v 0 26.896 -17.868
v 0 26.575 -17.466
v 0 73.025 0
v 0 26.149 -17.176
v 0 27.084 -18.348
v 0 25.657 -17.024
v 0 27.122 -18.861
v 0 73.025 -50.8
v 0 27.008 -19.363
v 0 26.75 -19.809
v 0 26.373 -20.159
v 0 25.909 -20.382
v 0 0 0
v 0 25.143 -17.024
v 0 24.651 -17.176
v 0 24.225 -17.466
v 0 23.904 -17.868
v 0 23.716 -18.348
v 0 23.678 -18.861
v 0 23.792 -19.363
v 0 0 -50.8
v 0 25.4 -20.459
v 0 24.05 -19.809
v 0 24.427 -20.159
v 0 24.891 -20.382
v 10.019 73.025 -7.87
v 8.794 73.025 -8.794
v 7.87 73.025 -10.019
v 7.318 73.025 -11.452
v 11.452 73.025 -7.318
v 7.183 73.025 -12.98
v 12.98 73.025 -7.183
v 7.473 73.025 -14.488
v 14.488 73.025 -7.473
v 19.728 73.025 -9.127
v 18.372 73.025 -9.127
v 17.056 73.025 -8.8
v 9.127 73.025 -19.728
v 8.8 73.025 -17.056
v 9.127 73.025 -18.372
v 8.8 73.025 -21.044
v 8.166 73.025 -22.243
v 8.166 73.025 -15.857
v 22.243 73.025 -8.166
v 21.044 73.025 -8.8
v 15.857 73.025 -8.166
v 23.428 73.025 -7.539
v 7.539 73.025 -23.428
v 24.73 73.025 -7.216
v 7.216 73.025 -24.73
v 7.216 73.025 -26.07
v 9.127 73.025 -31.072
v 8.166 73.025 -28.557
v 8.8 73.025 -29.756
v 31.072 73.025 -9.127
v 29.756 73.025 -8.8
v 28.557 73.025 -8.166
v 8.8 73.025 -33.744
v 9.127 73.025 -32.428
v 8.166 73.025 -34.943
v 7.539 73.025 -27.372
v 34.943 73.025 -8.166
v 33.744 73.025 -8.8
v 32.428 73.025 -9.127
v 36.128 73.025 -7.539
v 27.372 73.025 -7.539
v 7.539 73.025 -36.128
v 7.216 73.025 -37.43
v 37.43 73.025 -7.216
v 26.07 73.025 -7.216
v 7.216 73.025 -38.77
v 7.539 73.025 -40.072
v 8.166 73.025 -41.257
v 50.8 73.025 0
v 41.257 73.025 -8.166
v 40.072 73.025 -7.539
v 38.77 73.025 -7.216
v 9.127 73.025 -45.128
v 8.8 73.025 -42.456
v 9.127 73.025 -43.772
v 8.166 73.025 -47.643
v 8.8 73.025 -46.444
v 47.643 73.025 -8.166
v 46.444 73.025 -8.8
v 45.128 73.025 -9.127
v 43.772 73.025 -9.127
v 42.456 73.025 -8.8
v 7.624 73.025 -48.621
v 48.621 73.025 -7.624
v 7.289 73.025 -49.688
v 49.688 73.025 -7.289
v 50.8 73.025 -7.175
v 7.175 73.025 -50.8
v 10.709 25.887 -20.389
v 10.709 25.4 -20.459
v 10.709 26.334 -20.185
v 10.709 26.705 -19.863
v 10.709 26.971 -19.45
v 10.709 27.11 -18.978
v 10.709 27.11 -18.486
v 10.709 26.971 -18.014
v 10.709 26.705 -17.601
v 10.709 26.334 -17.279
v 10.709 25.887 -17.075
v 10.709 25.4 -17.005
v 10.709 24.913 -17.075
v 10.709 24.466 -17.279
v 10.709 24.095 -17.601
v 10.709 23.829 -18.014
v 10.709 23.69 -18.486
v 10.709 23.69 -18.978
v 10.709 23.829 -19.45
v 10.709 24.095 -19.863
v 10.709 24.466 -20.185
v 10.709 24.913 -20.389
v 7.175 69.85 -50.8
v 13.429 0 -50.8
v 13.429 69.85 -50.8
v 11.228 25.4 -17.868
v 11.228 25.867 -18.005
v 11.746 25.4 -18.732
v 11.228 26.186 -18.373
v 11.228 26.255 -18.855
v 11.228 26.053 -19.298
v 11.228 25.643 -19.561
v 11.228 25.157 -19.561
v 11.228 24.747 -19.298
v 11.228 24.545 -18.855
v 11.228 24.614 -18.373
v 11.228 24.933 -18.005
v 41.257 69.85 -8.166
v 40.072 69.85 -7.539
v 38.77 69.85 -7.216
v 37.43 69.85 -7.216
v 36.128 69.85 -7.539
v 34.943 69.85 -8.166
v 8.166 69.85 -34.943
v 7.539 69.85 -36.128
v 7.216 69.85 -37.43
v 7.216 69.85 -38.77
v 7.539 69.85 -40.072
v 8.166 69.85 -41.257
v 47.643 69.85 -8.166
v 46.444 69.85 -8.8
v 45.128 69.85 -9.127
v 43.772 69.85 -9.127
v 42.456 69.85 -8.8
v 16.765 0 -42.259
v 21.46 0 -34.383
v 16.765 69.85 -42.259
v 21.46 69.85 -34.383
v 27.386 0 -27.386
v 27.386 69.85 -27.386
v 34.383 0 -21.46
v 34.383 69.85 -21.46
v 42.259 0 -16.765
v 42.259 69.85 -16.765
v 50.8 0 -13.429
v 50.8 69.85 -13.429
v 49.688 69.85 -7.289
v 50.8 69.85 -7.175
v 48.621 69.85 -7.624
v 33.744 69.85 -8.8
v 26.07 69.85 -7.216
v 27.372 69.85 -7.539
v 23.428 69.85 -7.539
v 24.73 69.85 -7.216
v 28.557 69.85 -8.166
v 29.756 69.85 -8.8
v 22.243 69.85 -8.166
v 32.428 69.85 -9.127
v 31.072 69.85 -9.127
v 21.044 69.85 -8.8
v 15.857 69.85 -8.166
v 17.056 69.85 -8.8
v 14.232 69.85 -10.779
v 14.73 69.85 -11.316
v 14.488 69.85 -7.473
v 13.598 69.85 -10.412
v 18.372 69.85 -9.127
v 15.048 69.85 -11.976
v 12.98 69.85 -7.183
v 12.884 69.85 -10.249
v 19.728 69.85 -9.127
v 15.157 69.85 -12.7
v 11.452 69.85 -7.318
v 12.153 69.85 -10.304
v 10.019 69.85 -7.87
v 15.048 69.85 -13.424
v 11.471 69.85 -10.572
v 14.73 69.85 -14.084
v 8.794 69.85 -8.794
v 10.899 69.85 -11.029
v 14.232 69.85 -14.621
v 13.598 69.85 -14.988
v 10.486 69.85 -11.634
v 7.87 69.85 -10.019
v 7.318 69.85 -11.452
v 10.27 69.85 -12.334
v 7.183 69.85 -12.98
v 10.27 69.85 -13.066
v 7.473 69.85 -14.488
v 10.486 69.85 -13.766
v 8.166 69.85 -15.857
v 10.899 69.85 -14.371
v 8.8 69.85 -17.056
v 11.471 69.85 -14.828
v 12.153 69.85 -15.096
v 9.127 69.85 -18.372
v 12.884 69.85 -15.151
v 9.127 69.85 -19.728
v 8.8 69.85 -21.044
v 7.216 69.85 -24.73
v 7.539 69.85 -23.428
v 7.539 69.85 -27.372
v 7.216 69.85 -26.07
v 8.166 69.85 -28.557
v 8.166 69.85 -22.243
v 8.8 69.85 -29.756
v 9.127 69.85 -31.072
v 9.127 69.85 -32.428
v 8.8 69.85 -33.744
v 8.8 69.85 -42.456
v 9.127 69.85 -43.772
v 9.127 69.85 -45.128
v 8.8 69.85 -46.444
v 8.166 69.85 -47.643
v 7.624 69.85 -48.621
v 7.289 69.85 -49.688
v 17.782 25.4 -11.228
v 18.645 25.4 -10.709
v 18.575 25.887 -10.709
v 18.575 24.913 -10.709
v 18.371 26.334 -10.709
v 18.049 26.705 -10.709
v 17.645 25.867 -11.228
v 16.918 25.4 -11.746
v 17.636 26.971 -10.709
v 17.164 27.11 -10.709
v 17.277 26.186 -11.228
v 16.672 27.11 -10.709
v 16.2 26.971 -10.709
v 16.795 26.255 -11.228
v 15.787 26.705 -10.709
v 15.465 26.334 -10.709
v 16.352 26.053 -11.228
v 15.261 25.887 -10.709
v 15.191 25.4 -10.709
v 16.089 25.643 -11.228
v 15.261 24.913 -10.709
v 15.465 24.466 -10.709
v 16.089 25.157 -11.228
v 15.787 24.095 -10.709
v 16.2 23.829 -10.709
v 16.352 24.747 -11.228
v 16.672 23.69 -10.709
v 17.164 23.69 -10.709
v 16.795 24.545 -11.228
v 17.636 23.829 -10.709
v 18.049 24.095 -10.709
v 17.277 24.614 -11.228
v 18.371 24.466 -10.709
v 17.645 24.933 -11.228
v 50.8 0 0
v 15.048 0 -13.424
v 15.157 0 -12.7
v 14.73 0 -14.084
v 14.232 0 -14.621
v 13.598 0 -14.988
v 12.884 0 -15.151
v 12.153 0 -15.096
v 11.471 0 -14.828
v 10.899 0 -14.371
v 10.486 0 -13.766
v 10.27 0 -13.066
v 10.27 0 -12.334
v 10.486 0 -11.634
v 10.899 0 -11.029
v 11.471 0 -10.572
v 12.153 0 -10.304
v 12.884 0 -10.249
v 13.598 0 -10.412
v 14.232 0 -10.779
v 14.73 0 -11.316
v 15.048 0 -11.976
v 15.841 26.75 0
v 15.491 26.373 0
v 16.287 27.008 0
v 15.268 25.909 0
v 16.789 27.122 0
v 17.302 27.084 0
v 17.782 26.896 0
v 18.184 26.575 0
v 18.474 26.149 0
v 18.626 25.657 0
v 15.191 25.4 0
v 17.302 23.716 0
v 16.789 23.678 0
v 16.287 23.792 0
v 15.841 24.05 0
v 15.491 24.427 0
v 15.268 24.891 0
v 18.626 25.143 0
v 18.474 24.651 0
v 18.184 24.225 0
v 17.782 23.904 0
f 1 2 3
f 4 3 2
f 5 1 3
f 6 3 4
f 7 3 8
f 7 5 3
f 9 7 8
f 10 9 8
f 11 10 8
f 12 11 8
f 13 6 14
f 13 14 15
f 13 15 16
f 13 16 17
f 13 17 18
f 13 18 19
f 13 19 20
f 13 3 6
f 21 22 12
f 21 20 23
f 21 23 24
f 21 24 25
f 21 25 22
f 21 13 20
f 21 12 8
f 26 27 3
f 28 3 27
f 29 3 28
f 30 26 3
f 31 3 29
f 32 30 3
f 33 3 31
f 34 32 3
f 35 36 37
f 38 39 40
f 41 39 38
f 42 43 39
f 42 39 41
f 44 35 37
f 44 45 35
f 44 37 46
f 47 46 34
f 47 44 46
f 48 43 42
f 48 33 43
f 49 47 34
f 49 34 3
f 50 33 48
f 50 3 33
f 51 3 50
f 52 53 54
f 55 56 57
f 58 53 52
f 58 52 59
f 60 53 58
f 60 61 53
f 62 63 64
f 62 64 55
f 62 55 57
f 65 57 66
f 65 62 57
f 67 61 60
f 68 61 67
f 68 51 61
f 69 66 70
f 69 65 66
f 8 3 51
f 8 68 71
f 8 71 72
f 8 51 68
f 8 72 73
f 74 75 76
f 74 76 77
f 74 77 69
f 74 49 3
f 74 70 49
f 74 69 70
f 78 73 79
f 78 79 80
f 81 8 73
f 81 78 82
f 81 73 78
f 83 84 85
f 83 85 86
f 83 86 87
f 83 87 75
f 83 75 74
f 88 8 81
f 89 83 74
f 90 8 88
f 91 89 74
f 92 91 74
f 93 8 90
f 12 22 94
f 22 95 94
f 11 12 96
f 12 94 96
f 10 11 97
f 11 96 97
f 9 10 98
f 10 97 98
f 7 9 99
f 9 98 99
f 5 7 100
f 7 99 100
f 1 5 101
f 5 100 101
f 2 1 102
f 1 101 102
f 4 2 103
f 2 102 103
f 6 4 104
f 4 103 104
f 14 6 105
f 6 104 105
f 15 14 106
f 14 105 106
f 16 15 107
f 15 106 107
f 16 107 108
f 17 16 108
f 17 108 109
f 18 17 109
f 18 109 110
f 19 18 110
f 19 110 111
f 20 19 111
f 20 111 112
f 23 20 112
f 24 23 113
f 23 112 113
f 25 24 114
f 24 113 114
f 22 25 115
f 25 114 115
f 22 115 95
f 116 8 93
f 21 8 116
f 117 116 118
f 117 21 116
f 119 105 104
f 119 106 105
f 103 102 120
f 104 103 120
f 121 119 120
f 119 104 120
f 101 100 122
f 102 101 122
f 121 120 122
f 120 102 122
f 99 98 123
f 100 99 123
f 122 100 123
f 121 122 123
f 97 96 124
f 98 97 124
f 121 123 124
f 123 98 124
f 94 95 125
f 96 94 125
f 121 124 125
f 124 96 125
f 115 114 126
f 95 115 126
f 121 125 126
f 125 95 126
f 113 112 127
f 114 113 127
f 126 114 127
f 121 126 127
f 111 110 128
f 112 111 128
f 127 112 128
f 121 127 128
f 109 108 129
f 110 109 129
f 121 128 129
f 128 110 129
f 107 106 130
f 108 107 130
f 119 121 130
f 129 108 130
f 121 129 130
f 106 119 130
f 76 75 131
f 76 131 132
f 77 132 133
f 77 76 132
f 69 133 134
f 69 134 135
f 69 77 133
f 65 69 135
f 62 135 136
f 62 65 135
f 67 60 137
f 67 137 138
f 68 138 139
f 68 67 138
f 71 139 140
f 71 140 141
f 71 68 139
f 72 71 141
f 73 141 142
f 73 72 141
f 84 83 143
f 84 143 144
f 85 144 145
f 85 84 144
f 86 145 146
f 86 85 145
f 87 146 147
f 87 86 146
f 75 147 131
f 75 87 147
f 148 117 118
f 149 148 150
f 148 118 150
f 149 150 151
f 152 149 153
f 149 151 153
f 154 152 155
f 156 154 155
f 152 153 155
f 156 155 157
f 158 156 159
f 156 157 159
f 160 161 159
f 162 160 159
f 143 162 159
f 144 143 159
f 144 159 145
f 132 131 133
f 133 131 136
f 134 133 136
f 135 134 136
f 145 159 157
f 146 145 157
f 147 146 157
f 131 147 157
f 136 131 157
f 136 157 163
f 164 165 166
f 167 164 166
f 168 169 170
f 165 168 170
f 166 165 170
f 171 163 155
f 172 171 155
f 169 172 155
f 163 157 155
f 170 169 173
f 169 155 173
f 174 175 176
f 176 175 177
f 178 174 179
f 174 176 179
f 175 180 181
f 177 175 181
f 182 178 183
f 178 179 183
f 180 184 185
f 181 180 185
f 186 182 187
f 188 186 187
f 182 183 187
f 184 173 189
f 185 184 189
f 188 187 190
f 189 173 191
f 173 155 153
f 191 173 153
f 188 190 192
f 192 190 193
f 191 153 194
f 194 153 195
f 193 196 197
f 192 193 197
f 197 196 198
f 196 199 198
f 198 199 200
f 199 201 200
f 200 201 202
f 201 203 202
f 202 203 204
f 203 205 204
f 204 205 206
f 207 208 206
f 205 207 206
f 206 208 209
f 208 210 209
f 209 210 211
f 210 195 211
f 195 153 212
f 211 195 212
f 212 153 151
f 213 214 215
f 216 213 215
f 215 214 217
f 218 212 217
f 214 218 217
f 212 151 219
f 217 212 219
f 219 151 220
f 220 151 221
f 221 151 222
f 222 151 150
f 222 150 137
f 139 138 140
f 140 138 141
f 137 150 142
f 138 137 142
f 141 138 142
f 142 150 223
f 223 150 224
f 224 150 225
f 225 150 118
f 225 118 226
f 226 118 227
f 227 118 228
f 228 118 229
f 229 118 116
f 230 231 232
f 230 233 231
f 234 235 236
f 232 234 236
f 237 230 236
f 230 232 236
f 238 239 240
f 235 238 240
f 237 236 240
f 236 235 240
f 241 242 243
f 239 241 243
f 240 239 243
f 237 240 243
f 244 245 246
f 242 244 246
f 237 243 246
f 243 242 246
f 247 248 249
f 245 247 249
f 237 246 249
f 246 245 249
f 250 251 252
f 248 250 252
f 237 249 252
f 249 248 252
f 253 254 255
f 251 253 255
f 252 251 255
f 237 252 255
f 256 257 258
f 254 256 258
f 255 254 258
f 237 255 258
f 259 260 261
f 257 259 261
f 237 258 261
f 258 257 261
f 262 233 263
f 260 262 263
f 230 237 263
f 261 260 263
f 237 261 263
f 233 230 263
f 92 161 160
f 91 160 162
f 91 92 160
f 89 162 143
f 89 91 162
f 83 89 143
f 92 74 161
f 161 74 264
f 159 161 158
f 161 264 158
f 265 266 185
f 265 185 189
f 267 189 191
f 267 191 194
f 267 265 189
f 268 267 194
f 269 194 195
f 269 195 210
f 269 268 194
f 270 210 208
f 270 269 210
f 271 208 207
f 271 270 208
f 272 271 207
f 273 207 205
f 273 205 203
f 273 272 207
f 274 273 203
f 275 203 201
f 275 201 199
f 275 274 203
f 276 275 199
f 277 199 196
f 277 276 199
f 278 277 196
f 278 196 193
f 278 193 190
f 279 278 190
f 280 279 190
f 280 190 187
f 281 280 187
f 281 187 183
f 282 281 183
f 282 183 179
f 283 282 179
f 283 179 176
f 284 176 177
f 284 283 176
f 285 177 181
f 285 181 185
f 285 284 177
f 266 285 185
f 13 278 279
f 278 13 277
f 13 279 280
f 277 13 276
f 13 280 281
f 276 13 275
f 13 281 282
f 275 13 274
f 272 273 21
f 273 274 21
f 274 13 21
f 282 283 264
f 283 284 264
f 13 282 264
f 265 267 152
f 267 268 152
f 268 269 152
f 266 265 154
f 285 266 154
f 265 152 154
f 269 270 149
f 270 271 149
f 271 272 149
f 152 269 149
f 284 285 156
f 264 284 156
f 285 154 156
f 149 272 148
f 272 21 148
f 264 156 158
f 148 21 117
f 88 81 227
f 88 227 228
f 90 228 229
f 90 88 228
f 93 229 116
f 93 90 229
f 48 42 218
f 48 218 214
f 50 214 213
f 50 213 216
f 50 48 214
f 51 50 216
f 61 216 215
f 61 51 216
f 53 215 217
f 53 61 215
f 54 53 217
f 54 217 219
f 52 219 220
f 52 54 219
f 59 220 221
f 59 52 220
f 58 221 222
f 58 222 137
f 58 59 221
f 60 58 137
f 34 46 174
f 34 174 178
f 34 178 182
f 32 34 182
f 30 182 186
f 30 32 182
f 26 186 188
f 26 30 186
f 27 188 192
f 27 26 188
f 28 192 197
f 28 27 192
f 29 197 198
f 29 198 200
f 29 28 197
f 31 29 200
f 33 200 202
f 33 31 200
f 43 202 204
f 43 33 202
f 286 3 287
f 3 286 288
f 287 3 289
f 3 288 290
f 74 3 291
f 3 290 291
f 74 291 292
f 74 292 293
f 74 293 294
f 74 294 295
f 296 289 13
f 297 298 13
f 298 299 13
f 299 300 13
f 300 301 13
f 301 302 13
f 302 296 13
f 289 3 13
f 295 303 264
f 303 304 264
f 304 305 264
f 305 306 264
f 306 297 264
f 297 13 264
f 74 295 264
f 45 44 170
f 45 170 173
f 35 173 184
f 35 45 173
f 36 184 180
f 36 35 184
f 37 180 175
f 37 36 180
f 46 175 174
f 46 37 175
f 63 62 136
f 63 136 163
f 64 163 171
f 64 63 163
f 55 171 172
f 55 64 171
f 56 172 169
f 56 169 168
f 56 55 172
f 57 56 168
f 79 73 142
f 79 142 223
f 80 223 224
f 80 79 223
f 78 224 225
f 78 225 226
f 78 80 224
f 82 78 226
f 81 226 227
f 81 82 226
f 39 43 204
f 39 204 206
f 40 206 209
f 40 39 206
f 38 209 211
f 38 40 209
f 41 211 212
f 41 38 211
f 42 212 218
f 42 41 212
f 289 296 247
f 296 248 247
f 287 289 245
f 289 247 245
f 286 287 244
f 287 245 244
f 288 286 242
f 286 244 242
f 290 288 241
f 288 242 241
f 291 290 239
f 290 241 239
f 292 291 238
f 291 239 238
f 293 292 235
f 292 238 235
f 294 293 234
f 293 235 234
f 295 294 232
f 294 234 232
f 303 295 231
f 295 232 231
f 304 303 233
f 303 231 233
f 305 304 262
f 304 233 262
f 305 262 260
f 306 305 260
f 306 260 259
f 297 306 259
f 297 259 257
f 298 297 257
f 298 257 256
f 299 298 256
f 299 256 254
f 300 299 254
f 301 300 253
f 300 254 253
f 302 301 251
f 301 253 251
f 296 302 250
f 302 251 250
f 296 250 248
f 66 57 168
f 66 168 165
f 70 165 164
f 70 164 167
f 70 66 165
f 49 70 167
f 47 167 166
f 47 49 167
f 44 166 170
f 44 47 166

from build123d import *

# Parameters (mm, degrees)
SKETCH1_W                            = 50.8
SKETCH1_H                            = 50.8
BOSS_EXTRUDE1_DEPTH                  = 73.025
CUT_EXTRUDE1_DEPTH                   = 3.175
SKETCH3_R                            = 55.5625
CUT_EXTRUDE2_DEPTH                   = 103.439887861
F_8_32_TAPPED_HOLE1_D                = 3.4544
F_8_32_TAPPED_HOLE1_DEPTH            = 10.70864
F_8_32_TAPPED_HOLE1_TIP              = 1.037806461
F_8_32_TAPPED_HOLE2_D                = 3.4544
F_8_32_TAPPED_HOLE2_DEPTH            = 10.70864
F_8_32_TAPPED_HOLE2_TIP              = 1.037806461
F_10_0_1935_DIAMETER_HOLE1_OUTLINE_R = 2.45745
F_10_0_1935_DIAMETER_HOLE1_DEPTH     = 69.85


# Read off the part's stored shape, not the designer's step: #10 (0.1935) Diameter Hole1
with BuildPart() as part:
    # Sketch1 → Boss-Extrude1 (new body)
    with BuildSketch(Plane(origin=(0, 0, 0), x_dir=(1, 0, 0), z_dir=(0, 1, 0))):
        with Locations((25.4, 25.4)):
            Rectangle(SKETCH1_W, SKETCH1_H)
    extrude(amount=BOSS_EXTRUDE1_DEPTH)

    # Sketch2 → Cut-Extrude1 (cut)
    with BuildSketch(Plane(origin=(0, 73.025, 0), x_dir=(1, 0, 0), z_dir=(0, 1, 0))):
        with BuildLine():
            Line((130.016993909, 125.017737196), (134.25782275, 78.573759143))
            ThreePointArc((134.25782275, 78.573759143), (134.034685181, 75.298190088), (132.798116214, 72.256802214))
            ThreePointArc((132.798116214, 72.256802214), (130.01096738, 66.280890285), (128.580118229, 59.844090402))
            ThreePointArc((128.580118229, 59.844090402), (125.846501332, 47.24207899), (120.576283082, 35.473130329))
            ThreePointArc((120.576283082, 35.473130329), (120.013426501, 34.114565768), (119.824473194, 32.656209898))
            ThreePointArc((119.824473194, 32.656209898), (117.90735564, 28.45485307), (113.469501546, 27.177281171))
            ThreePointArc((113.469501546, 27.177281171), (106.116591491, 23.83727612), (106.198458812, 15.761744078))
            ThreePointArc((106.198458812, 15.761744078), (105.465515747, 8.75311664), (98.443142857, 8.166309094))
            ThreePointArc((98.443142857, 8.166309094), (95.25, 9.168506799), (92.056857143, 8.166309094))
            ThreePointArc((92.056857143, 8.166309094), (88.9, 7.1755), (85.743142857, 8.166309094))
            ThreePointArc((85.743142857, 8.166309094), (82.55, 9.168506799), (79.356857143, 8.166309094))
            ThreePointArc((79.356857143, 8.166309094), (76.212257074, 7.175513597), (73.063291467, 8.152345678))
            ThreePointArc((73.063291467, 8.152345678), (69.907489389, 9.140393728), (66.74574768, 8.171520637))
            ThreePointArc((66.74574768, 8.171520637), (63.508942298, 7.175501389), (60.273525168, 8.176020964))
            ThreePointArc((60.273525168, 8.176020964), (57.10532095, 9.149271709), (53.943097961, 8.156759366))
            ThreePointArc((53.943097961, 8.156759366), (50.791625748, 7.175506347), (47.643142857, 8.166309094))
            ThreePointArc((47.643142857, 8.166309094), (44.45, 9.168506799), (41.256857143, 8.166309094))
            ThreePointArc((41.256857143, 8.166309094), (38.1, 7.1755), (34.943142857, 8.166309094))
            ThreePointArc((34.943142857, 8.166309094), (31.75, 9.168506799), (28.556857143, 8.166309094))
            ThreePointArc((28.556857143, 8.166309094), (25.4, 7.1755), (22.243142857, 8.166309094))
            ThreePointArc((22.243142857, 8.166309094), (19.05, 9.168506799), (15.856857143, 8.166309094))
            ThreePointArc((15.856857143, 8.166309094), (8.793588587, 8.793588587), (8.166309094, 15.856857143))
            ThreePointArc((8.166309094, 15.856857143), (9.168506799, 19.05), (8.166309094, 22.243142857))
            ThreePointArc((8.166309094, 22.243142857), (7.1755, 25.4), (8.166309094, 28.556857143))
            ThreePointArc((8.166309094, 28.556857143), (9.168506799, 31.75), (8.166309094, 34.943142857))
            ThreePointArc((8.166309094, 34.943142857), (7.1755, 38.1), (8.166309094, 41.256857143))
            ThreePointArc((8.166309094, 41.256857143), (9.168506799, 44.45), (8.166309094, 47.643142857))
            ThreePointArc((8.166309094, 47.643142857), (7.175506347, 50.791625748), (8.156759366, 53.943097961))
            ThreePointArc((8.156759366, 53.943097961), (9.149271709, 57.10532095), (8.176020964, 60.273525168))
            ThreePointArc((8.176020964, 60.273525168), (7.175501389, 63.508942298), (8.171520637, 66.74574768))
            ThreePointArc((8.171520637, 66.74574768), (9.140393728, 69.907489389), (8.152345678, 73.063291467))
            ThreePointArc((8.152345678, 73.063291467), (7.175513597, 76.212257074), (8.166309094, 79.356857143))
            ThreePointArc((8.166309094, 79.356857143), (9.168506799, 82.55), (8.166309094, 85.743142857))
            ThreePointArc((8.166309094, 85.743142857), (7.1755, 88.9), (8.166309094, 92.056857143))
            ThreePointArc((8.166309094, 92.056857143), (9.168506799, 95.25), (8.166309094, 98.443142857))
            ThreePointArc((8.166309094, 98.443142857), (8.75311664, 105.465515747), (15.761744078, 106.198458812))
            ThreePointArc((15.761744078, 106.198458812), (23.83727612, 106.116591491), (27.177281171, 113.469501546))
            ThreePointArc((27.177281171, 113.469501546), (28.45485307, 117.90735564), (32.656209898, 119.824473194))
            ThreePointArc((32.656209898, 119.824473194), (34.114565768, 120.013426501), (35.473130329, 120.576283082))
            ThreePointArc((35.473130329, 120.576283082), (47.24207899, 125.846501332), (59.844090402, 128.580118229))
            ThreePointArc((59.844090402, 128.580118229), (68.705211612, 130.952457845), (76.452938417, 135.863689229))
            ThreePointArc((76.452938417, 135.863689229), (80.625736152, 138.0725352), (85.345346996, 138.201045691))
            Line((85.345346996, 138.201045691), (125.626948268, 129.926898817))
            ThreePointArc((125.626948268, 129.926898817), (128.63345164, 128.197989094), (130.016993909, 125.017737196))
        make_face()
    extrude(amount=-CUT_EXTRUDE1_DEPTH, mode=Mode.SUBTRACT)

    # Sketch3 → Cut-Extrude2 (cut, through all)
    with BuildSketch(Plane(origin=(0, 73.025, 0), x_dir=(1, 0, 0), z_dir=(0, 1, 0))):
        with Locations((66.675, 66.675)):
            Circle(SKETCH3_R)
    extrude(amount=-CUT_EXTRUDE2_DEPTH, mode=Mode.SUBTRACT)

    # #8-32 Tapped Hole1
    with Locations(Plane(origin=(393.7, -15.875, 0), x_dir=(1, 0, 0), z_dir=(0, 0, 1))):
        with Locations((-376.782, 41.275)):
            Hole(F_8_32_TAPPED_HOLE1_D / 2, depth=F_8_32_TAPPED_HOLE1_DEPTH)
            with Locations((0, 0, -(F_8_32_TAPPED_HOLE1_DEPTH + F_8_32_TAPPED_HOLE1_TIP / 2))):  # 118° drill point
                Cone(0, F_8_32_TAPPED_HOLE1_D / 2, F_8_32_TAPPED_HOLE1_TIP, mode=Mode.SUBTRACT)

    # #8-32 Tapped Hole2
    with Locations(Plane(origin=(0, -15.875, -393.7), x_dir=(0, 0, 1), z_dir=(-1, 0, 0))):
        with Locations((374.968, 41.275)):
            Hole(F_8_32_TAPPED_HOLE2_D / 2, depth=F_8_32_TAPPED_HOLE2_DEPTH)
            with Locations((0, 0, -(F_8_32_TAPPED_HOLE2_DEPTH + F_8_32_TAPPED_HOLE2_TIP / 2))):  # 118° drill point
                Cone(0, F_8_32_TAPPED_HOLE2_D / 2, F_8_32_TAPPED_HOLE2_TIP, mode=Mode.SUBTRACT)

    # #10 (0.1935) Diameter Hole1 outline → #10 (0.1935) Diameter Hole1 (cut)
    with BuildSketch(Plane(origin=(0, 0, 0), x_dir=(1, 0, 0), z_dir=(0, 1, 0))):
        with Locations((12.7, 12.7)):
            Circle(F_10_0_1935_DIAMETER_HOLE1_OUTLINE_R)
    extrude(amount=F_10_0_1935_DIAMETER_HOLE1_DEPTH, mode=Mode.SUBTRACT)


solid = part.part
